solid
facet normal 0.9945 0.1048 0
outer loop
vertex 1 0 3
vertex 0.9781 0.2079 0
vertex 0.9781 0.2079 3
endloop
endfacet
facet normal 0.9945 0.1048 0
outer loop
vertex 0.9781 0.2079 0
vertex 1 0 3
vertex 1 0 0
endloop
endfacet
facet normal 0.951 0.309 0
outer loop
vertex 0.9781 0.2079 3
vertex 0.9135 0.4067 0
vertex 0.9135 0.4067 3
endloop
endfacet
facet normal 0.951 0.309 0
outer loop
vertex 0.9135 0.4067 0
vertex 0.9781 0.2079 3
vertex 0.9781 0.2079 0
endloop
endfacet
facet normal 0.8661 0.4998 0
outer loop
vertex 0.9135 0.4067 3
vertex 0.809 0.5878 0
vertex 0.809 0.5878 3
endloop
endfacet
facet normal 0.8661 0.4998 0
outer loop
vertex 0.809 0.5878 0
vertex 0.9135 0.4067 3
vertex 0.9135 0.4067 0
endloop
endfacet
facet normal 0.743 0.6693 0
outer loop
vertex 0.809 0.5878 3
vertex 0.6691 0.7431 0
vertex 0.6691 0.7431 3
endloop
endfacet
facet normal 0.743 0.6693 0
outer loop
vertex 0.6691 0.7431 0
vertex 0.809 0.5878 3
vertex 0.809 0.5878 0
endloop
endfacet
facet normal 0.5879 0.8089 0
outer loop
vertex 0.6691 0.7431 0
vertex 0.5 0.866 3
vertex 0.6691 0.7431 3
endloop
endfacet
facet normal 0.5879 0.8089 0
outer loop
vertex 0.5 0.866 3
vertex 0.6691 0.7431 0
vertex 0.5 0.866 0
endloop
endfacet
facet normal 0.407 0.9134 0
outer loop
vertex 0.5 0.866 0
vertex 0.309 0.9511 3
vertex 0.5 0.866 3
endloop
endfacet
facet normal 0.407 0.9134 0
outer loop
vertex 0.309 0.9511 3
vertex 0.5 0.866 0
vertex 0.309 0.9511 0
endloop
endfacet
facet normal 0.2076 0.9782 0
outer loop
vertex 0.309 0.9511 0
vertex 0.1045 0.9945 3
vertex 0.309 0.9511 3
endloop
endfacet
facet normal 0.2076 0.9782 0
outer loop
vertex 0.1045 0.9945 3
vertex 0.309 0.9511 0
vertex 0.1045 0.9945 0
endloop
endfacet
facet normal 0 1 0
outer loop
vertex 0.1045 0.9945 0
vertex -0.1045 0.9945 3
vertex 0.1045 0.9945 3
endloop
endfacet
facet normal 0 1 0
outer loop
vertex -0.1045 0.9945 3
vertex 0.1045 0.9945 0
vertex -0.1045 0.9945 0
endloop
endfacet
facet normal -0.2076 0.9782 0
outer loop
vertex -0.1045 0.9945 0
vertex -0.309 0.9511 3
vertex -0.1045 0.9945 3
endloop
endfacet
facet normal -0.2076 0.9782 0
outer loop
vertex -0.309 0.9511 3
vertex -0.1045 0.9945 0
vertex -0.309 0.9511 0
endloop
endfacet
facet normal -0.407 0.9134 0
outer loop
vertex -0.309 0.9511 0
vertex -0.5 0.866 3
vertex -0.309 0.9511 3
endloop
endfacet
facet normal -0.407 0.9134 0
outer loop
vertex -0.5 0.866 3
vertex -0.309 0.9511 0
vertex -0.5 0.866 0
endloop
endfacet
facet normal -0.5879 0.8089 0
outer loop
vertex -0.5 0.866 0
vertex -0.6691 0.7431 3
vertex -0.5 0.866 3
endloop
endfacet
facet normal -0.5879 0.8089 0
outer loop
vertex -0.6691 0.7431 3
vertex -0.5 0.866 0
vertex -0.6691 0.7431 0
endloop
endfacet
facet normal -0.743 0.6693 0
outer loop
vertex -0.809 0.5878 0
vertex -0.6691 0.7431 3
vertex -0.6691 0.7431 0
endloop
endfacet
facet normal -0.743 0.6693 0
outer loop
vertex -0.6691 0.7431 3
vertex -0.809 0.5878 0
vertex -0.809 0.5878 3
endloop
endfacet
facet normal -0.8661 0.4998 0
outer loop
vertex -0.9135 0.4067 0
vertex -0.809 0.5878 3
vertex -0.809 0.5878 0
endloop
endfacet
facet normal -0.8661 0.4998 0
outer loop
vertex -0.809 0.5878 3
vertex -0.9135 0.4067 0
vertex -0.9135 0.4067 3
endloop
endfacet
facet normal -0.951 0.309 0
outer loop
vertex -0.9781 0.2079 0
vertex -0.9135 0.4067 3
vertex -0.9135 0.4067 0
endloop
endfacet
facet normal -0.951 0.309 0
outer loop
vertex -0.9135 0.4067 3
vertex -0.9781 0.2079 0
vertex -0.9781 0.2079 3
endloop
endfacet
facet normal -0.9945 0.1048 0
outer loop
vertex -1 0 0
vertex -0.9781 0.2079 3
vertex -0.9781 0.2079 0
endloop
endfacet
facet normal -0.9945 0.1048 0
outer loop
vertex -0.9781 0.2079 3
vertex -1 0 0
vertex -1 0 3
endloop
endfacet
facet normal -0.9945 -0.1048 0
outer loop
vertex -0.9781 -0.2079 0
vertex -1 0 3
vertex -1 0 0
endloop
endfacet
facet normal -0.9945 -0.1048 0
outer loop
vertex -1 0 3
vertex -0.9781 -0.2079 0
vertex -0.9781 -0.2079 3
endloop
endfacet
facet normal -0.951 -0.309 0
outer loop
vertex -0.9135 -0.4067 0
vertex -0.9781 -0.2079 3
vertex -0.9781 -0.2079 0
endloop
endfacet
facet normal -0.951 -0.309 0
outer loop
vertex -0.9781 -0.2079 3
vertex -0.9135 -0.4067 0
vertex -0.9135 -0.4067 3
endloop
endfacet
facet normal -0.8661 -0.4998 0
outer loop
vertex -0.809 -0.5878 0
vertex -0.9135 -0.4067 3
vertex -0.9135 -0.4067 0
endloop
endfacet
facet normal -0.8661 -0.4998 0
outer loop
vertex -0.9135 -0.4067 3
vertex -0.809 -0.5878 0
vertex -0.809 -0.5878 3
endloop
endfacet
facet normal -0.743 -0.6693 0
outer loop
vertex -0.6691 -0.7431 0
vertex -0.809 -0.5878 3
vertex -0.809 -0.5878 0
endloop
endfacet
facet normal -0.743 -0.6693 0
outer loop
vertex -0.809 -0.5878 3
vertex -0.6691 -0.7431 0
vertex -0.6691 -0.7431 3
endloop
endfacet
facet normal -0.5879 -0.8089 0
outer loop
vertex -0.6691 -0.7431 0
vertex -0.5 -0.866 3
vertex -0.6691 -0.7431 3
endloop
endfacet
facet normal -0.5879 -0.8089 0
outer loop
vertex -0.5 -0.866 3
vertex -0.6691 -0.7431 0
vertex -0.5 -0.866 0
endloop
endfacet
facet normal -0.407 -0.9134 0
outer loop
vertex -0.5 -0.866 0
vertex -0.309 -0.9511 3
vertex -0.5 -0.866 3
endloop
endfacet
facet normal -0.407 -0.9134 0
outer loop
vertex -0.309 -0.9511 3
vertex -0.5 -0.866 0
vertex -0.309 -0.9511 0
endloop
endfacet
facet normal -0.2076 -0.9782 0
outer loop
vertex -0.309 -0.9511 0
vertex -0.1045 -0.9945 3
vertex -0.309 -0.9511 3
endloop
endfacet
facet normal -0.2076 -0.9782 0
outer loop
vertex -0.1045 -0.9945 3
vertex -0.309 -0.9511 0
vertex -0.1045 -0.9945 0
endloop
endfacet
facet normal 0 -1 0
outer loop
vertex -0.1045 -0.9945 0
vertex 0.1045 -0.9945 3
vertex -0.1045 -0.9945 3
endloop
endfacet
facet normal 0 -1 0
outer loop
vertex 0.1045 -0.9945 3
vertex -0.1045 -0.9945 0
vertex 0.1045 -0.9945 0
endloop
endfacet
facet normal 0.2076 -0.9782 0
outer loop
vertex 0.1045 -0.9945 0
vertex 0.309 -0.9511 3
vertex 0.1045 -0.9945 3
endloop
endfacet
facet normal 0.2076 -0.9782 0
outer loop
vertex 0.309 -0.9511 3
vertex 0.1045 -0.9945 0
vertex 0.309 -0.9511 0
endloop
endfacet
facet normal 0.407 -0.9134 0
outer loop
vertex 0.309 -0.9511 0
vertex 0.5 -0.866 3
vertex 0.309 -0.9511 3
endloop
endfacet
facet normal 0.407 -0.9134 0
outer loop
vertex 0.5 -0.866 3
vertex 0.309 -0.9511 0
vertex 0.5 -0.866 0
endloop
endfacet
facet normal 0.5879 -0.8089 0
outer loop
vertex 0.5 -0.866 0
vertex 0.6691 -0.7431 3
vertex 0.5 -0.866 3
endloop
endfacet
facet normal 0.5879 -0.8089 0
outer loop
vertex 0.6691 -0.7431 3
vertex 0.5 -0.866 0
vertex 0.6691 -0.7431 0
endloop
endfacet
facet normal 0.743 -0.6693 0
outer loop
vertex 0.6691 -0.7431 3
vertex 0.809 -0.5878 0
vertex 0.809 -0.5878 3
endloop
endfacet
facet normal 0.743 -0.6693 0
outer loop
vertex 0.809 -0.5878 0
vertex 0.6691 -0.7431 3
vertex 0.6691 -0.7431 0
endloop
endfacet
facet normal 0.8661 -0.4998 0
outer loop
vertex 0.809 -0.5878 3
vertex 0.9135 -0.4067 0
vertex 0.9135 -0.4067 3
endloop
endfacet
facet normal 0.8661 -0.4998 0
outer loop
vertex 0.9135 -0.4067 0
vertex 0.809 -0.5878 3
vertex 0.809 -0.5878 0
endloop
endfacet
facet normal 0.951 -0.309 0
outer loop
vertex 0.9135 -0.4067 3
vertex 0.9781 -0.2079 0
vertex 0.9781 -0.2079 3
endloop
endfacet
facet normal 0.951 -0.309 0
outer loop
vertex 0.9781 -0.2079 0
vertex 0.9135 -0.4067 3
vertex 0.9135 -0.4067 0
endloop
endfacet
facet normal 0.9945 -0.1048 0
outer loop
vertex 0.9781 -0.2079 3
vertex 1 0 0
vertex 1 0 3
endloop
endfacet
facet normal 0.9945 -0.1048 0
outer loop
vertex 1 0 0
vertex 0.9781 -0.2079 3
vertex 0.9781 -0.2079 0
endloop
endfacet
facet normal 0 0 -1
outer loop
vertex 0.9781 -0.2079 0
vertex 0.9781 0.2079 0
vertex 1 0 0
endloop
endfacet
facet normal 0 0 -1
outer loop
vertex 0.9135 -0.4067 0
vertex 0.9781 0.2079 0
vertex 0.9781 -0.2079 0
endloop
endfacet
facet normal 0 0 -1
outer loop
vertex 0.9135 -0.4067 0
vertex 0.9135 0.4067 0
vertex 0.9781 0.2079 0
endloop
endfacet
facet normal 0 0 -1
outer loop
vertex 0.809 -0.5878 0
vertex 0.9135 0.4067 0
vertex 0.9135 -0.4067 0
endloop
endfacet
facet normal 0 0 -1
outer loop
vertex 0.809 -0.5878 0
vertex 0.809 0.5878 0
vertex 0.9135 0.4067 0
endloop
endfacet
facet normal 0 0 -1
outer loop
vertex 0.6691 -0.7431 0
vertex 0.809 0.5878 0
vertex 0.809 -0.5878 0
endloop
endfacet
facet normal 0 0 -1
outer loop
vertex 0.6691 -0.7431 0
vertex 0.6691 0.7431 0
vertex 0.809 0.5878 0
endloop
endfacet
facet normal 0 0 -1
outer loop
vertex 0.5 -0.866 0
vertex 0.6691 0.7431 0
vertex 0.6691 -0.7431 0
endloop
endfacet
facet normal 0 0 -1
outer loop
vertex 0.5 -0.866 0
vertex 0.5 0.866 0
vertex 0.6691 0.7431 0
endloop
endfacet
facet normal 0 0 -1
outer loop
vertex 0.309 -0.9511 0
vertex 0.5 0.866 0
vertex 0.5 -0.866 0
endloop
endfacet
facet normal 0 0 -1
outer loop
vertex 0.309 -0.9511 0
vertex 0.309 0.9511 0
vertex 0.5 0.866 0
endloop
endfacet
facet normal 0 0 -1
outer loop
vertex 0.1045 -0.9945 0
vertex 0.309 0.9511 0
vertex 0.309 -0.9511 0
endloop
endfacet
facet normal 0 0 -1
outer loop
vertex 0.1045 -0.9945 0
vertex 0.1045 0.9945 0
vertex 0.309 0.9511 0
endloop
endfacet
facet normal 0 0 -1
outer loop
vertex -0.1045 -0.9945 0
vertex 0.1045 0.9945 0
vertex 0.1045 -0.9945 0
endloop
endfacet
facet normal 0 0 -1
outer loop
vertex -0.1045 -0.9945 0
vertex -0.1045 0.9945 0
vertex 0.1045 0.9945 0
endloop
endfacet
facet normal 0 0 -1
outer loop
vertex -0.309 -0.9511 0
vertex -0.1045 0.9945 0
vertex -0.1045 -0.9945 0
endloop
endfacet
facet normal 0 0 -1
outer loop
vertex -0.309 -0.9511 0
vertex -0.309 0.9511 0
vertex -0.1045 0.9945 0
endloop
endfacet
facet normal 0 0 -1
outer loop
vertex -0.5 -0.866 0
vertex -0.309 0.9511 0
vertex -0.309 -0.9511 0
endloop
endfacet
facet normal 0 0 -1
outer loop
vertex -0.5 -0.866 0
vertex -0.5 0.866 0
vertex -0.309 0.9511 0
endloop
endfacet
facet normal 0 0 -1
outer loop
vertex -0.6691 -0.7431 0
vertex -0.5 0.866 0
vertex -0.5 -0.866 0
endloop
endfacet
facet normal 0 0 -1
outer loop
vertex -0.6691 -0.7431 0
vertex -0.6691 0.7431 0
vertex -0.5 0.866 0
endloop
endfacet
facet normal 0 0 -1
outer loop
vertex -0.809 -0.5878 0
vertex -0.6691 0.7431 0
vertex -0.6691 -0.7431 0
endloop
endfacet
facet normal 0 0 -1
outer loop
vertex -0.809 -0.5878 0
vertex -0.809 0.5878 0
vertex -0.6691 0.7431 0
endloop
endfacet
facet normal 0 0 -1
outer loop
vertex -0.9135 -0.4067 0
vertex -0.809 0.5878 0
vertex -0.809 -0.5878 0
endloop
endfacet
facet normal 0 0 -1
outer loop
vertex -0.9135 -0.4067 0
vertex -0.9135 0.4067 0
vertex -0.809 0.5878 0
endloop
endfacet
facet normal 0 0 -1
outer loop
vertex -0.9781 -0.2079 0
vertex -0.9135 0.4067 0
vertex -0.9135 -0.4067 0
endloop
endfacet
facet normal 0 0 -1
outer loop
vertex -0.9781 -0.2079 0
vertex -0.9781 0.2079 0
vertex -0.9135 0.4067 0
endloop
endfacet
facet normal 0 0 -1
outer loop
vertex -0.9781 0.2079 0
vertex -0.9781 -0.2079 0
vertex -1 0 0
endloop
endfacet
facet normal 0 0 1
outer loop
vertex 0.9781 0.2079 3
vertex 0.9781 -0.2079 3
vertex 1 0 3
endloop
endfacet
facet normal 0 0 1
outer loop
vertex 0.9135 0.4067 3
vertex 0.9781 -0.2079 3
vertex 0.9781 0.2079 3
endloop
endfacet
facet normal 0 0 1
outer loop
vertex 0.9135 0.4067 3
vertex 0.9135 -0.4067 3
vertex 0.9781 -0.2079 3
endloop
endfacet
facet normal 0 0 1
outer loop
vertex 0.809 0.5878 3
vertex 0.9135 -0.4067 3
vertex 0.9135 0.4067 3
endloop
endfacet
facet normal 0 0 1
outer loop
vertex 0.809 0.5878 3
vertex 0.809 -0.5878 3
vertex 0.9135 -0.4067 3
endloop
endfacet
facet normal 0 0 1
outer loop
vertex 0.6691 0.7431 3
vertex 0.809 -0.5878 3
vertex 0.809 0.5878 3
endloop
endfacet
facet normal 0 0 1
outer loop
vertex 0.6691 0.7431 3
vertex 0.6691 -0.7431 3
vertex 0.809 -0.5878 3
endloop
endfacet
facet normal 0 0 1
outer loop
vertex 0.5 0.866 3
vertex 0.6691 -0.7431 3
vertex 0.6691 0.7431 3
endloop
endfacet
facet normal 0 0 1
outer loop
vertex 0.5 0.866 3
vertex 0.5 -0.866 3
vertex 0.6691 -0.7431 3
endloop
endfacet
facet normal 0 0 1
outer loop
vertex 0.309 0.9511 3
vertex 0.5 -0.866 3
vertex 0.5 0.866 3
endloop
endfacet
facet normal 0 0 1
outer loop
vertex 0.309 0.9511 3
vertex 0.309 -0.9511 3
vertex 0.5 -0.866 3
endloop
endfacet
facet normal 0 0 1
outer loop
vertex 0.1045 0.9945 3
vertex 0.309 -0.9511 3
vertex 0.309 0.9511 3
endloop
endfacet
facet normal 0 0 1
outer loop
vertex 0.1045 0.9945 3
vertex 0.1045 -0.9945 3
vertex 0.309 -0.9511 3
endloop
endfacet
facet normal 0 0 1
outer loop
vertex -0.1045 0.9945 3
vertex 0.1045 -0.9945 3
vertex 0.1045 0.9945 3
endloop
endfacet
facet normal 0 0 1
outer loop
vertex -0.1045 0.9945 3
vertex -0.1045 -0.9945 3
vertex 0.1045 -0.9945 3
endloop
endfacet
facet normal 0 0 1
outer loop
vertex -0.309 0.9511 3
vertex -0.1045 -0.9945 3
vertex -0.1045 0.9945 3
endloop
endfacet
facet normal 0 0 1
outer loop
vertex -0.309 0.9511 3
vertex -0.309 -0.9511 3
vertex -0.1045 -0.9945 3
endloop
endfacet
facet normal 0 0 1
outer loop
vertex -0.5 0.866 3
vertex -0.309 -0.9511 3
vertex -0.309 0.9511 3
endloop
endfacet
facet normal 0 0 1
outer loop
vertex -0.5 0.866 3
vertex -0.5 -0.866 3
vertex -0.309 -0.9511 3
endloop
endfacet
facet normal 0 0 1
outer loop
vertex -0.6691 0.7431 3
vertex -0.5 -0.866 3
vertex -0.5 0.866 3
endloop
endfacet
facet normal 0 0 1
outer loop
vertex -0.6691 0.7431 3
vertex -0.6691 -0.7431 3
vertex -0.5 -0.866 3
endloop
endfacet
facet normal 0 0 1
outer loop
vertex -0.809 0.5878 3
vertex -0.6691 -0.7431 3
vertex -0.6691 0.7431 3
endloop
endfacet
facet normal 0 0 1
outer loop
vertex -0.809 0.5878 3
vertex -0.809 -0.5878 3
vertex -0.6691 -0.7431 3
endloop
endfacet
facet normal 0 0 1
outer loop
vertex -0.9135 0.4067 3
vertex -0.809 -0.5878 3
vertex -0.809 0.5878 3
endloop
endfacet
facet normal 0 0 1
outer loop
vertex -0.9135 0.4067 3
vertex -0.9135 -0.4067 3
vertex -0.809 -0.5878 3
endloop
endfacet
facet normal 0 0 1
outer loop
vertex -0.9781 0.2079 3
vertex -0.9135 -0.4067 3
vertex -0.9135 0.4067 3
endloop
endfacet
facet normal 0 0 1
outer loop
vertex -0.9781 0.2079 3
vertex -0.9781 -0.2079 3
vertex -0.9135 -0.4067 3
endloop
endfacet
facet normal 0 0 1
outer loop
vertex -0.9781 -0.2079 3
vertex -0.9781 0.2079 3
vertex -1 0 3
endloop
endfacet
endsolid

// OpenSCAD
// [inibitore, orientamento,  raggio, facce, altezza]
genome_in = [];
genome = genome_in;
gene_len=5;
function altezz(index) = ( index == 0 ? 0 : genome[index-gene_len]*genome[index-1] + altezz(index-gene_len) ); 

raggi = [ for (i = [2 : gene_len : len(genome)]) genome[i] ];
min_r = min(raggi);


for (g=[0:gene_len:len(genome)-gene_len]){
    inibitore = genome[g];
    orientamento = genome[g+1];
    raggio = genome[g+2];
    facce = genome[g+3];
    altezza = genome[g+4];
    if(inibitore==1){ 
        translate([0,0,altezz(g)])
            linear_extrude(height = altezza)
                rotate([0,0,orientamento])
                    difference(){
                        circle(raggio,$fn=facce);
                        circle(min_r-1,$fn=30);
                    }
    }

}

//tappo

 cylinder(h = 3, r = min_r-1, $fn=30);
